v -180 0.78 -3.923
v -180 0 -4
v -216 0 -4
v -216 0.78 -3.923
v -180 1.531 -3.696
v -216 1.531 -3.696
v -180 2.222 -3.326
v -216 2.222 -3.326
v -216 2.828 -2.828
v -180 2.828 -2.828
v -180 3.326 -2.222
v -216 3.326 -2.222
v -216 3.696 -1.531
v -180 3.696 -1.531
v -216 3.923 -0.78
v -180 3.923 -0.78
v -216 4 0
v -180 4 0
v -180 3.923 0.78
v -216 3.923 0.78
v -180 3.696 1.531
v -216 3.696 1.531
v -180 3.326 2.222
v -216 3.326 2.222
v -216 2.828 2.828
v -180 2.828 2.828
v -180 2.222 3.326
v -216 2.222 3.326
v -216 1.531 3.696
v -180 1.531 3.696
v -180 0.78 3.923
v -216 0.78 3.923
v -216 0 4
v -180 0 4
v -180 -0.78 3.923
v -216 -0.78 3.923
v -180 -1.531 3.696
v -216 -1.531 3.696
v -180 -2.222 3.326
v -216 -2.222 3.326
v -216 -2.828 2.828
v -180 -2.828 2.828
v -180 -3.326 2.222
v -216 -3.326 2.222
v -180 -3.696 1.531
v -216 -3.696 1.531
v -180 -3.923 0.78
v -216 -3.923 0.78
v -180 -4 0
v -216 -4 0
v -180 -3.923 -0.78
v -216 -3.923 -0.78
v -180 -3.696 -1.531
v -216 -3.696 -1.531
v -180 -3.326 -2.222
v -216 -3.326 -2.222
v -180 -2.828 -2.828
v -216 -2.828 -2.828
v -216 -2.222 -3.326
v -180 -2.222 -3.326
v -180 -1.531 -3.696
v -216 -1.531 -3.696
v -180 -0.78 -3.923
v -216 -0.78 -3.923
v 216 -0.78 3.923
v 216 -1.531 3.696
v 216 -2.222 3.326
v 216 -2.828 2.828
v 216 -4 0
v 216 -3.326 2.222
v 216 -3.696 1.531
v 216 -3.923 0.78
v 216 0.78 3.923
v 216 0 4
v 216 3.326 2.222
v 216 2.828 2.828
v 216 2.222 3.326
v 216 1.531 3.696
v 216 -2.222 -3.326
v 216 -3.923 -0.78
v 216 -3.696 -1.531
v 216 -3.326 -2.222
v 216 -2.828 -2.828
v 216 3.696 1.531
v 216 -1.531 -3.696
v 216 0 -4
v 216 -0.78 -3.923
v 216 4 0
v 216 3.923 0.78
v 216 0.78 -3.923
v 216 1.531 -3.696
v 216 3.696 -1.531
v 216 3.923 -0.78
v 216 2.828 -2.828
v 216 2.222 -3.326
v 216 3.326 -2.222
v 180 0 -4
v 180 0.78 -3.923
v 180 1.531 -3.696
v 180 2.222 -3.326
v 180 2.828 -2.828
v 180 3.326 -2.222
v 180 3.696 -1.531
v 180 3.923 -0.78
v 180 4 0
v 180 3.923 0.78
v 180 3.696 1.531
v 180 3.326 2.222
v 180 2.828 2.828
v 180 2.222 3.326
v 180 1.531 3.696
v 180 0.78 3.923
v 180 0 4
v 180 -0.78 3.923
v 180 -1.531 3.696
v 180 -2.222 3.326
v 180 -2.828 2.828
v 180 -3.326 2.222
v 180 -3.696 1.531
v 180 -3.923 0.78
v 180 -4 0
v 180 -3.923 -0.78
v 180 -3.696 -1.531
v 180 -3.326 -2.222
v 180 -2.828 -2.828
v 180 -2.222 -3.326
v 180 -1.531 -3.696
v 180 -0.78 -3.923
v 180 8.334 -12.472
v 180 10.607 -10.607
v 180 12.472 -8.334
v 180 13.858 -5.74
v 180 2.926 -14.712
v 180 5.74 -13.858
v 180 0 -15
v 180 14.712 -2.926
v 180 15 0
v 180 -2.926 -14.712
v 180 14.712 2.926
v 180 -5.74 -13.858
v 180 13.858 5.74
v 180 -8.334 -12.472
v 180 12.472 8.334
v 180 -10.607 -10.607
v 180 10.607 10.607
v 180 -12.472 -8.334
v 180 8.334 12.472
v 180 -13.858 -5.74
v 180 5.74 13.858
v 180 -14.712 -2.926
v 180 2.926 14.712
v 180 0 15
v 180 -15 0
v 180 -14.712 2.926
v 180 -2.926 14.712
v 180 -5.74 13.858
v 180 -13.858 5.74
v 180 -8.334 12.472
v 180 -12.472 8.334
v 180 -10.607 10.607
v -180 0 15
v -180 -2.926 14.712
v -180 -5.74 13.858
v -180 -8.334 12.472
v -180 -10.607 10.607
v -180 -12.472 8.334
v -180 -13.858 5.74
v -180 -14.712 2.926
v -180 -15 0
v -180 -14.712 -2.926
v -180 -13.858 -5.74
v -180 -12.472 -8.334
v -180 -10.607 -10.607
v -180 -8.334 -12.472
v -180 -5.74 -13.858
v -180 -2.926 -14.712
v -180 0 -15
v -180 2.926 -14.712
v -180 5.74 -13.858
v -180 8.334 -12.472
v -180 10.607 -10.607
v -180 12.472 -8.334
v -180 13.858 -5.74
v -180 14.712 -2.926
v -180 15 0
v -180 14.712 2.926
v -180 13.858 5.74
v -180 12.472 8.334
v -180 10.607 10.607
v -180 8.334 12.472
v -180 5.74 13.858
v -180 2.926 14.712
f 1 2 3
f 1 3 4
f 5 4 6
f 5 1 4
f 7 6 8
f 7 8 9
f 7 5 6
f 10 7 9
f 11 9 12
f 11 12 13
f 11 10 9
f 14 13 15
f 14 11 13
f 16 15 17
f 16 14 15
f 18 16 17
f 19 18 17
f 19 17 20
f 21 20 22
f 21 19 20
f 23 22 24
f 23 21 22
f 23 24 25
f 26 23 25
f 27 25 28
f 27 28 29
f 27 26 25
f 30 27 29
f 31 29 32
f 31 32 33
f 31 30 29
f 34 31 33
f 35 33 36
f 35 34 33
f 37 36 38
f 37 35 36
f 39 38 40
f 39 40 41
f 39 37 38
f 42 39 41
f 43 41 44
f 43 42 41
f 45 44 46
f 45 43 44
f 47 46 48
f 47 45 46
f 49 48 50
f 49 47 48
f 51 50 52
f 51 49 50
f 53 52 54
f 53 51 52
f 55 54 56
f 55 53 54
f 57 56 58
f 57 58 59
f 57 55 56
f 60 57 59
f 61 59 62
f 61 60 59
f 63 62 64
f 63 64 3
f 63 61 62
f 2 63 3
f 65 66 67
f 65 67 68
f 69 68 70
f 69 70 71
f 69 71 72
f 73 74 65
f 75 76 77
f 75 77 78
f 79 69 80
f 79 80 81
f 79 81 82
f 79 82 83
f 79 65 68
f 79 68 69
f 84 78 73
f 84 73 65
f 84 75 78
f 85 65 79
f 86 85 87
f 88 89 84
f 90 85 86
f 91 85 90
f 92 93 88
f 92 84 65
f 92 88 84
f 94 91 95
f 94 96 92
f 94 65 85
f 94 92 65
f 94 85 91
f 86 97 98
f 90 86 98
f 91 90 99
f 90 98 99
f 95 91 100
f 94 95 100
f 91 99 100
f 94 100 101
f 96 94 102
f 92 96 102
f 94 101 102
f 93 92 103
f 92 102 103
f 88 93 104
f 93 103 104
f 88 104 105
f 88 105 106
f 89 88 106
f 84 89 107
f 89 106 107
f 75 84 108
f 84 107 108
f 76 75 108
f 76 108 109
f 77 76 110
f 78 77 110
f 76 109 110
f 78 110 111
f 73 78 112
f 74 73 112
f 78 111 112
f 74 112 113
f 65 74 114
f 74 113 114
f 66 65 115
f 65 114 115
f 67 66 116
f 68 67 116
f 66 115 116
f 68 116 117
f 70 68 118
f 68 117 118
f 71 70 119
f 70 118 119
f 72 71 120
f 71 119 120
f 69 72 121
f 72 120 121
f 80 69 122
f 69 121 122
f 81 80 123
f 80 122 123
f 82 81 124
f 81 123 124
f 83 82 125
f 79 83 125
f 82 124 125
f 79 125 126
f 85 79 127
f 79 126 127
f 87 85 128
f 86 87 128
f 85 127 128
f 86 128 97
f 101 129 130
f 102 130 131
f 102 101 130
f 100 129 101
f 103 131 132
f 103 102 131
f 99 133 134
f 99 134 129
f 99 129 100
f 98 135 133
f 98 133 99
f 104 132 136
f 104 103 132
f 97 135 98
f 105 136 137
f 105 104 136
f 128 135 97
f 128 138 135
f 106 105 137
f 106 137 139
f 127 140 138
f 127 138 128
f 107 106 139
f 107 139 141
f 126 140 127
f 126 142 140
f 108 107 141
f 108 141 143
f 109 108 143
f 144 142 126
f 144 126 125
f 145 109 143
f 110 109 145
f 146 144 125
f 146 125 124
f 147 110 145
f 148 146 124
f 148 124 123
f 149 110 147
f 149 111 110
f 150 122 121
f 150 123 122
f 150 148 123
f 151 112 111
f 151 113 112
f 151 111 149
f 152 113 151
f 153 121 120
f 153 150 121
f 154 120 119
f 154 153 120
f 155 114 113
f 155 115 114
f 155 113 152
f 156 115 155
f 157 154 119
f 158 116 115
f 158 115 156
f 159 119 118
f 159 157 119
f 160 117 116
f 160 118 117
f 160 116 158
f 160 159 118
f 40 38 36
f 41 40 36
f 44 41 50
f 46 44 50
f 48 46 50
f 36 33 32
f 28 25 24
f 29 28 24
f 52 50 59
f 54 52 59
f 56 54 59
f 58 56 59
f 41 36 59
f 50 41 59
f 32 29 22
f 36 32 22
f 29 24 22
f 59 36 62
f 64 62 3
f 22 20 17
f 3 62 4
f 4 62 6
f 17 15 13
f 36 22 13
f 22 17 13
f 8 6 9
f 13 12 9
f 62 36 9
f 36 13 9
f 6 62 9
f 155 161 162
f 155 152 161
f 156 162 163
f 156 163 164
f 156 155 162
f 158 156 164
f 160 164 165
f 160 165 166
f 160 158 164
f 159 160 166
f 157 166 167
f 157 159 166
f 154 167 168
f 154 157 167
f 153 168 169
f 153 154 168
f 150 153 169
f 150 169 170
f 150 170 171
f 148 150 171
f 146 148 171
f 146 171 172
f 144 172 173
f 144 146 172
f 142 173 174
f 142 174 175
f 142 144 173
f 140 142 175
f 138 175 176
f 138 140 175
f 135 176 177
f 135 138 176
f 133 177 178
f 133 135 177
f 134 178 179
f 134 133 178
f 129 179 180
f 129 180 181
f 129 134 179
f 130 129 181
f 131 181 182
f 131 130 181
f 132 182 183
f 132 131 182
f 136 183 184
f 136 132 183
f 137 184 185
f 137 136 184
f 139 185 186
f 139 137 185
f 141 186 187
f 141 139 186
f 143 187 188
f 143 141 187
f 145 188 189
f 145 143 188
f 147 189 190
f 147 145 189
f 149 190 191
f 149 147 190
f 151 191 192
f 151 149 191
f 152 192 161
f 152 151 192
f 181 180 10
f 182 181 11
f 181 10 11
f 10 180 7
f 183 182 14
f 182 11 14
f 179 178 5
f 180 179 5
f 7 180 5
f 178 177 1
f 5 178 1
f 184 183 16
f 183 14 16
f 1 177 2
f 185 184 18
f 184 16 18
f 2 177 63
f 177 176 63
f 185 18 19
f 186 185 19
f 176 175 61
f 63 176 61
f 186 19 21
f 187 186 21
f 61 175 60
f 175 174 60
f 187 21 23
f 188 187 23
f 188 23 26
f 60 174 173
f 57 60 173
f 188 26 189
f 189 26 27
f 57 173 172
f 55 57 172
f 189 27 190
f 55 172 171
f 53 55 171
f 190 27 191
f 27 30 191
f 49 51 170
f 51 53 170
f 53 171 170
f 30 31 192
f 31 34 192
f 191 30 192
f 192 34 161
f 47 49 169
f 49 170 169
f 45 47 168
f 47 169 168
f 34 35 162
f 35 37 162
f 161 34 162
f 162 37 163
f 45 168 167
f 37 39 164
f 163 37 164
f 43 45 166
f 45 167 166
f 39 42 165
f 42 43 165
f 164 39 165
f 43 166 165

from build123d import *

# Parameters (mm, degrees)
SKETCH2_R           = 15
BOSS_EXTRUDE1_DEPTH = 180
SKETCH3_R           = 4
BOSS_EXTRUDE2_DEPTH = 36


with BuildPart() as part:
    # Sketch2 → Boss-Extrude1 (new body)
    with BuildSketch(Plane(origin=(0, 0, 0), x_dir=(0, 0, -1), z_dir=(1, 0, 0))):
        with Locations(Location((0, 0, 0), (0, 0, 180))):
            Circle(SKETCH2_R)
    boss_extrude1 = extrude(amount=BOSS_EXTRUDE1_DEPTH)

    # Sketch3 → Boss-Extrude2 (add)
    with BuildSketch(Plane(origin=(180, 0, 0), x_dir=(0, 0, -1), z_dir=(1, 0, 0))):
        Circle(SKETCH3_R)
    boss_extrude2 = extrude(amount=BOSS_EXTRUDE2_DEPTH)

    # Mirror1: Boss-Extrude1, Boss-Extrude2 across plane
    add(boss_extrude1.mirror(Plane(origin=(0, 0, 0), x_dir=(0, 0, 1), z_dir=(1, 0, 0))))
    add(boss_extrude2.mirror(Plane(origin=(0, 0, 0), x_dir=(0, 0, 1), z_dir=(1, 0, 0))))


solid = part.part
